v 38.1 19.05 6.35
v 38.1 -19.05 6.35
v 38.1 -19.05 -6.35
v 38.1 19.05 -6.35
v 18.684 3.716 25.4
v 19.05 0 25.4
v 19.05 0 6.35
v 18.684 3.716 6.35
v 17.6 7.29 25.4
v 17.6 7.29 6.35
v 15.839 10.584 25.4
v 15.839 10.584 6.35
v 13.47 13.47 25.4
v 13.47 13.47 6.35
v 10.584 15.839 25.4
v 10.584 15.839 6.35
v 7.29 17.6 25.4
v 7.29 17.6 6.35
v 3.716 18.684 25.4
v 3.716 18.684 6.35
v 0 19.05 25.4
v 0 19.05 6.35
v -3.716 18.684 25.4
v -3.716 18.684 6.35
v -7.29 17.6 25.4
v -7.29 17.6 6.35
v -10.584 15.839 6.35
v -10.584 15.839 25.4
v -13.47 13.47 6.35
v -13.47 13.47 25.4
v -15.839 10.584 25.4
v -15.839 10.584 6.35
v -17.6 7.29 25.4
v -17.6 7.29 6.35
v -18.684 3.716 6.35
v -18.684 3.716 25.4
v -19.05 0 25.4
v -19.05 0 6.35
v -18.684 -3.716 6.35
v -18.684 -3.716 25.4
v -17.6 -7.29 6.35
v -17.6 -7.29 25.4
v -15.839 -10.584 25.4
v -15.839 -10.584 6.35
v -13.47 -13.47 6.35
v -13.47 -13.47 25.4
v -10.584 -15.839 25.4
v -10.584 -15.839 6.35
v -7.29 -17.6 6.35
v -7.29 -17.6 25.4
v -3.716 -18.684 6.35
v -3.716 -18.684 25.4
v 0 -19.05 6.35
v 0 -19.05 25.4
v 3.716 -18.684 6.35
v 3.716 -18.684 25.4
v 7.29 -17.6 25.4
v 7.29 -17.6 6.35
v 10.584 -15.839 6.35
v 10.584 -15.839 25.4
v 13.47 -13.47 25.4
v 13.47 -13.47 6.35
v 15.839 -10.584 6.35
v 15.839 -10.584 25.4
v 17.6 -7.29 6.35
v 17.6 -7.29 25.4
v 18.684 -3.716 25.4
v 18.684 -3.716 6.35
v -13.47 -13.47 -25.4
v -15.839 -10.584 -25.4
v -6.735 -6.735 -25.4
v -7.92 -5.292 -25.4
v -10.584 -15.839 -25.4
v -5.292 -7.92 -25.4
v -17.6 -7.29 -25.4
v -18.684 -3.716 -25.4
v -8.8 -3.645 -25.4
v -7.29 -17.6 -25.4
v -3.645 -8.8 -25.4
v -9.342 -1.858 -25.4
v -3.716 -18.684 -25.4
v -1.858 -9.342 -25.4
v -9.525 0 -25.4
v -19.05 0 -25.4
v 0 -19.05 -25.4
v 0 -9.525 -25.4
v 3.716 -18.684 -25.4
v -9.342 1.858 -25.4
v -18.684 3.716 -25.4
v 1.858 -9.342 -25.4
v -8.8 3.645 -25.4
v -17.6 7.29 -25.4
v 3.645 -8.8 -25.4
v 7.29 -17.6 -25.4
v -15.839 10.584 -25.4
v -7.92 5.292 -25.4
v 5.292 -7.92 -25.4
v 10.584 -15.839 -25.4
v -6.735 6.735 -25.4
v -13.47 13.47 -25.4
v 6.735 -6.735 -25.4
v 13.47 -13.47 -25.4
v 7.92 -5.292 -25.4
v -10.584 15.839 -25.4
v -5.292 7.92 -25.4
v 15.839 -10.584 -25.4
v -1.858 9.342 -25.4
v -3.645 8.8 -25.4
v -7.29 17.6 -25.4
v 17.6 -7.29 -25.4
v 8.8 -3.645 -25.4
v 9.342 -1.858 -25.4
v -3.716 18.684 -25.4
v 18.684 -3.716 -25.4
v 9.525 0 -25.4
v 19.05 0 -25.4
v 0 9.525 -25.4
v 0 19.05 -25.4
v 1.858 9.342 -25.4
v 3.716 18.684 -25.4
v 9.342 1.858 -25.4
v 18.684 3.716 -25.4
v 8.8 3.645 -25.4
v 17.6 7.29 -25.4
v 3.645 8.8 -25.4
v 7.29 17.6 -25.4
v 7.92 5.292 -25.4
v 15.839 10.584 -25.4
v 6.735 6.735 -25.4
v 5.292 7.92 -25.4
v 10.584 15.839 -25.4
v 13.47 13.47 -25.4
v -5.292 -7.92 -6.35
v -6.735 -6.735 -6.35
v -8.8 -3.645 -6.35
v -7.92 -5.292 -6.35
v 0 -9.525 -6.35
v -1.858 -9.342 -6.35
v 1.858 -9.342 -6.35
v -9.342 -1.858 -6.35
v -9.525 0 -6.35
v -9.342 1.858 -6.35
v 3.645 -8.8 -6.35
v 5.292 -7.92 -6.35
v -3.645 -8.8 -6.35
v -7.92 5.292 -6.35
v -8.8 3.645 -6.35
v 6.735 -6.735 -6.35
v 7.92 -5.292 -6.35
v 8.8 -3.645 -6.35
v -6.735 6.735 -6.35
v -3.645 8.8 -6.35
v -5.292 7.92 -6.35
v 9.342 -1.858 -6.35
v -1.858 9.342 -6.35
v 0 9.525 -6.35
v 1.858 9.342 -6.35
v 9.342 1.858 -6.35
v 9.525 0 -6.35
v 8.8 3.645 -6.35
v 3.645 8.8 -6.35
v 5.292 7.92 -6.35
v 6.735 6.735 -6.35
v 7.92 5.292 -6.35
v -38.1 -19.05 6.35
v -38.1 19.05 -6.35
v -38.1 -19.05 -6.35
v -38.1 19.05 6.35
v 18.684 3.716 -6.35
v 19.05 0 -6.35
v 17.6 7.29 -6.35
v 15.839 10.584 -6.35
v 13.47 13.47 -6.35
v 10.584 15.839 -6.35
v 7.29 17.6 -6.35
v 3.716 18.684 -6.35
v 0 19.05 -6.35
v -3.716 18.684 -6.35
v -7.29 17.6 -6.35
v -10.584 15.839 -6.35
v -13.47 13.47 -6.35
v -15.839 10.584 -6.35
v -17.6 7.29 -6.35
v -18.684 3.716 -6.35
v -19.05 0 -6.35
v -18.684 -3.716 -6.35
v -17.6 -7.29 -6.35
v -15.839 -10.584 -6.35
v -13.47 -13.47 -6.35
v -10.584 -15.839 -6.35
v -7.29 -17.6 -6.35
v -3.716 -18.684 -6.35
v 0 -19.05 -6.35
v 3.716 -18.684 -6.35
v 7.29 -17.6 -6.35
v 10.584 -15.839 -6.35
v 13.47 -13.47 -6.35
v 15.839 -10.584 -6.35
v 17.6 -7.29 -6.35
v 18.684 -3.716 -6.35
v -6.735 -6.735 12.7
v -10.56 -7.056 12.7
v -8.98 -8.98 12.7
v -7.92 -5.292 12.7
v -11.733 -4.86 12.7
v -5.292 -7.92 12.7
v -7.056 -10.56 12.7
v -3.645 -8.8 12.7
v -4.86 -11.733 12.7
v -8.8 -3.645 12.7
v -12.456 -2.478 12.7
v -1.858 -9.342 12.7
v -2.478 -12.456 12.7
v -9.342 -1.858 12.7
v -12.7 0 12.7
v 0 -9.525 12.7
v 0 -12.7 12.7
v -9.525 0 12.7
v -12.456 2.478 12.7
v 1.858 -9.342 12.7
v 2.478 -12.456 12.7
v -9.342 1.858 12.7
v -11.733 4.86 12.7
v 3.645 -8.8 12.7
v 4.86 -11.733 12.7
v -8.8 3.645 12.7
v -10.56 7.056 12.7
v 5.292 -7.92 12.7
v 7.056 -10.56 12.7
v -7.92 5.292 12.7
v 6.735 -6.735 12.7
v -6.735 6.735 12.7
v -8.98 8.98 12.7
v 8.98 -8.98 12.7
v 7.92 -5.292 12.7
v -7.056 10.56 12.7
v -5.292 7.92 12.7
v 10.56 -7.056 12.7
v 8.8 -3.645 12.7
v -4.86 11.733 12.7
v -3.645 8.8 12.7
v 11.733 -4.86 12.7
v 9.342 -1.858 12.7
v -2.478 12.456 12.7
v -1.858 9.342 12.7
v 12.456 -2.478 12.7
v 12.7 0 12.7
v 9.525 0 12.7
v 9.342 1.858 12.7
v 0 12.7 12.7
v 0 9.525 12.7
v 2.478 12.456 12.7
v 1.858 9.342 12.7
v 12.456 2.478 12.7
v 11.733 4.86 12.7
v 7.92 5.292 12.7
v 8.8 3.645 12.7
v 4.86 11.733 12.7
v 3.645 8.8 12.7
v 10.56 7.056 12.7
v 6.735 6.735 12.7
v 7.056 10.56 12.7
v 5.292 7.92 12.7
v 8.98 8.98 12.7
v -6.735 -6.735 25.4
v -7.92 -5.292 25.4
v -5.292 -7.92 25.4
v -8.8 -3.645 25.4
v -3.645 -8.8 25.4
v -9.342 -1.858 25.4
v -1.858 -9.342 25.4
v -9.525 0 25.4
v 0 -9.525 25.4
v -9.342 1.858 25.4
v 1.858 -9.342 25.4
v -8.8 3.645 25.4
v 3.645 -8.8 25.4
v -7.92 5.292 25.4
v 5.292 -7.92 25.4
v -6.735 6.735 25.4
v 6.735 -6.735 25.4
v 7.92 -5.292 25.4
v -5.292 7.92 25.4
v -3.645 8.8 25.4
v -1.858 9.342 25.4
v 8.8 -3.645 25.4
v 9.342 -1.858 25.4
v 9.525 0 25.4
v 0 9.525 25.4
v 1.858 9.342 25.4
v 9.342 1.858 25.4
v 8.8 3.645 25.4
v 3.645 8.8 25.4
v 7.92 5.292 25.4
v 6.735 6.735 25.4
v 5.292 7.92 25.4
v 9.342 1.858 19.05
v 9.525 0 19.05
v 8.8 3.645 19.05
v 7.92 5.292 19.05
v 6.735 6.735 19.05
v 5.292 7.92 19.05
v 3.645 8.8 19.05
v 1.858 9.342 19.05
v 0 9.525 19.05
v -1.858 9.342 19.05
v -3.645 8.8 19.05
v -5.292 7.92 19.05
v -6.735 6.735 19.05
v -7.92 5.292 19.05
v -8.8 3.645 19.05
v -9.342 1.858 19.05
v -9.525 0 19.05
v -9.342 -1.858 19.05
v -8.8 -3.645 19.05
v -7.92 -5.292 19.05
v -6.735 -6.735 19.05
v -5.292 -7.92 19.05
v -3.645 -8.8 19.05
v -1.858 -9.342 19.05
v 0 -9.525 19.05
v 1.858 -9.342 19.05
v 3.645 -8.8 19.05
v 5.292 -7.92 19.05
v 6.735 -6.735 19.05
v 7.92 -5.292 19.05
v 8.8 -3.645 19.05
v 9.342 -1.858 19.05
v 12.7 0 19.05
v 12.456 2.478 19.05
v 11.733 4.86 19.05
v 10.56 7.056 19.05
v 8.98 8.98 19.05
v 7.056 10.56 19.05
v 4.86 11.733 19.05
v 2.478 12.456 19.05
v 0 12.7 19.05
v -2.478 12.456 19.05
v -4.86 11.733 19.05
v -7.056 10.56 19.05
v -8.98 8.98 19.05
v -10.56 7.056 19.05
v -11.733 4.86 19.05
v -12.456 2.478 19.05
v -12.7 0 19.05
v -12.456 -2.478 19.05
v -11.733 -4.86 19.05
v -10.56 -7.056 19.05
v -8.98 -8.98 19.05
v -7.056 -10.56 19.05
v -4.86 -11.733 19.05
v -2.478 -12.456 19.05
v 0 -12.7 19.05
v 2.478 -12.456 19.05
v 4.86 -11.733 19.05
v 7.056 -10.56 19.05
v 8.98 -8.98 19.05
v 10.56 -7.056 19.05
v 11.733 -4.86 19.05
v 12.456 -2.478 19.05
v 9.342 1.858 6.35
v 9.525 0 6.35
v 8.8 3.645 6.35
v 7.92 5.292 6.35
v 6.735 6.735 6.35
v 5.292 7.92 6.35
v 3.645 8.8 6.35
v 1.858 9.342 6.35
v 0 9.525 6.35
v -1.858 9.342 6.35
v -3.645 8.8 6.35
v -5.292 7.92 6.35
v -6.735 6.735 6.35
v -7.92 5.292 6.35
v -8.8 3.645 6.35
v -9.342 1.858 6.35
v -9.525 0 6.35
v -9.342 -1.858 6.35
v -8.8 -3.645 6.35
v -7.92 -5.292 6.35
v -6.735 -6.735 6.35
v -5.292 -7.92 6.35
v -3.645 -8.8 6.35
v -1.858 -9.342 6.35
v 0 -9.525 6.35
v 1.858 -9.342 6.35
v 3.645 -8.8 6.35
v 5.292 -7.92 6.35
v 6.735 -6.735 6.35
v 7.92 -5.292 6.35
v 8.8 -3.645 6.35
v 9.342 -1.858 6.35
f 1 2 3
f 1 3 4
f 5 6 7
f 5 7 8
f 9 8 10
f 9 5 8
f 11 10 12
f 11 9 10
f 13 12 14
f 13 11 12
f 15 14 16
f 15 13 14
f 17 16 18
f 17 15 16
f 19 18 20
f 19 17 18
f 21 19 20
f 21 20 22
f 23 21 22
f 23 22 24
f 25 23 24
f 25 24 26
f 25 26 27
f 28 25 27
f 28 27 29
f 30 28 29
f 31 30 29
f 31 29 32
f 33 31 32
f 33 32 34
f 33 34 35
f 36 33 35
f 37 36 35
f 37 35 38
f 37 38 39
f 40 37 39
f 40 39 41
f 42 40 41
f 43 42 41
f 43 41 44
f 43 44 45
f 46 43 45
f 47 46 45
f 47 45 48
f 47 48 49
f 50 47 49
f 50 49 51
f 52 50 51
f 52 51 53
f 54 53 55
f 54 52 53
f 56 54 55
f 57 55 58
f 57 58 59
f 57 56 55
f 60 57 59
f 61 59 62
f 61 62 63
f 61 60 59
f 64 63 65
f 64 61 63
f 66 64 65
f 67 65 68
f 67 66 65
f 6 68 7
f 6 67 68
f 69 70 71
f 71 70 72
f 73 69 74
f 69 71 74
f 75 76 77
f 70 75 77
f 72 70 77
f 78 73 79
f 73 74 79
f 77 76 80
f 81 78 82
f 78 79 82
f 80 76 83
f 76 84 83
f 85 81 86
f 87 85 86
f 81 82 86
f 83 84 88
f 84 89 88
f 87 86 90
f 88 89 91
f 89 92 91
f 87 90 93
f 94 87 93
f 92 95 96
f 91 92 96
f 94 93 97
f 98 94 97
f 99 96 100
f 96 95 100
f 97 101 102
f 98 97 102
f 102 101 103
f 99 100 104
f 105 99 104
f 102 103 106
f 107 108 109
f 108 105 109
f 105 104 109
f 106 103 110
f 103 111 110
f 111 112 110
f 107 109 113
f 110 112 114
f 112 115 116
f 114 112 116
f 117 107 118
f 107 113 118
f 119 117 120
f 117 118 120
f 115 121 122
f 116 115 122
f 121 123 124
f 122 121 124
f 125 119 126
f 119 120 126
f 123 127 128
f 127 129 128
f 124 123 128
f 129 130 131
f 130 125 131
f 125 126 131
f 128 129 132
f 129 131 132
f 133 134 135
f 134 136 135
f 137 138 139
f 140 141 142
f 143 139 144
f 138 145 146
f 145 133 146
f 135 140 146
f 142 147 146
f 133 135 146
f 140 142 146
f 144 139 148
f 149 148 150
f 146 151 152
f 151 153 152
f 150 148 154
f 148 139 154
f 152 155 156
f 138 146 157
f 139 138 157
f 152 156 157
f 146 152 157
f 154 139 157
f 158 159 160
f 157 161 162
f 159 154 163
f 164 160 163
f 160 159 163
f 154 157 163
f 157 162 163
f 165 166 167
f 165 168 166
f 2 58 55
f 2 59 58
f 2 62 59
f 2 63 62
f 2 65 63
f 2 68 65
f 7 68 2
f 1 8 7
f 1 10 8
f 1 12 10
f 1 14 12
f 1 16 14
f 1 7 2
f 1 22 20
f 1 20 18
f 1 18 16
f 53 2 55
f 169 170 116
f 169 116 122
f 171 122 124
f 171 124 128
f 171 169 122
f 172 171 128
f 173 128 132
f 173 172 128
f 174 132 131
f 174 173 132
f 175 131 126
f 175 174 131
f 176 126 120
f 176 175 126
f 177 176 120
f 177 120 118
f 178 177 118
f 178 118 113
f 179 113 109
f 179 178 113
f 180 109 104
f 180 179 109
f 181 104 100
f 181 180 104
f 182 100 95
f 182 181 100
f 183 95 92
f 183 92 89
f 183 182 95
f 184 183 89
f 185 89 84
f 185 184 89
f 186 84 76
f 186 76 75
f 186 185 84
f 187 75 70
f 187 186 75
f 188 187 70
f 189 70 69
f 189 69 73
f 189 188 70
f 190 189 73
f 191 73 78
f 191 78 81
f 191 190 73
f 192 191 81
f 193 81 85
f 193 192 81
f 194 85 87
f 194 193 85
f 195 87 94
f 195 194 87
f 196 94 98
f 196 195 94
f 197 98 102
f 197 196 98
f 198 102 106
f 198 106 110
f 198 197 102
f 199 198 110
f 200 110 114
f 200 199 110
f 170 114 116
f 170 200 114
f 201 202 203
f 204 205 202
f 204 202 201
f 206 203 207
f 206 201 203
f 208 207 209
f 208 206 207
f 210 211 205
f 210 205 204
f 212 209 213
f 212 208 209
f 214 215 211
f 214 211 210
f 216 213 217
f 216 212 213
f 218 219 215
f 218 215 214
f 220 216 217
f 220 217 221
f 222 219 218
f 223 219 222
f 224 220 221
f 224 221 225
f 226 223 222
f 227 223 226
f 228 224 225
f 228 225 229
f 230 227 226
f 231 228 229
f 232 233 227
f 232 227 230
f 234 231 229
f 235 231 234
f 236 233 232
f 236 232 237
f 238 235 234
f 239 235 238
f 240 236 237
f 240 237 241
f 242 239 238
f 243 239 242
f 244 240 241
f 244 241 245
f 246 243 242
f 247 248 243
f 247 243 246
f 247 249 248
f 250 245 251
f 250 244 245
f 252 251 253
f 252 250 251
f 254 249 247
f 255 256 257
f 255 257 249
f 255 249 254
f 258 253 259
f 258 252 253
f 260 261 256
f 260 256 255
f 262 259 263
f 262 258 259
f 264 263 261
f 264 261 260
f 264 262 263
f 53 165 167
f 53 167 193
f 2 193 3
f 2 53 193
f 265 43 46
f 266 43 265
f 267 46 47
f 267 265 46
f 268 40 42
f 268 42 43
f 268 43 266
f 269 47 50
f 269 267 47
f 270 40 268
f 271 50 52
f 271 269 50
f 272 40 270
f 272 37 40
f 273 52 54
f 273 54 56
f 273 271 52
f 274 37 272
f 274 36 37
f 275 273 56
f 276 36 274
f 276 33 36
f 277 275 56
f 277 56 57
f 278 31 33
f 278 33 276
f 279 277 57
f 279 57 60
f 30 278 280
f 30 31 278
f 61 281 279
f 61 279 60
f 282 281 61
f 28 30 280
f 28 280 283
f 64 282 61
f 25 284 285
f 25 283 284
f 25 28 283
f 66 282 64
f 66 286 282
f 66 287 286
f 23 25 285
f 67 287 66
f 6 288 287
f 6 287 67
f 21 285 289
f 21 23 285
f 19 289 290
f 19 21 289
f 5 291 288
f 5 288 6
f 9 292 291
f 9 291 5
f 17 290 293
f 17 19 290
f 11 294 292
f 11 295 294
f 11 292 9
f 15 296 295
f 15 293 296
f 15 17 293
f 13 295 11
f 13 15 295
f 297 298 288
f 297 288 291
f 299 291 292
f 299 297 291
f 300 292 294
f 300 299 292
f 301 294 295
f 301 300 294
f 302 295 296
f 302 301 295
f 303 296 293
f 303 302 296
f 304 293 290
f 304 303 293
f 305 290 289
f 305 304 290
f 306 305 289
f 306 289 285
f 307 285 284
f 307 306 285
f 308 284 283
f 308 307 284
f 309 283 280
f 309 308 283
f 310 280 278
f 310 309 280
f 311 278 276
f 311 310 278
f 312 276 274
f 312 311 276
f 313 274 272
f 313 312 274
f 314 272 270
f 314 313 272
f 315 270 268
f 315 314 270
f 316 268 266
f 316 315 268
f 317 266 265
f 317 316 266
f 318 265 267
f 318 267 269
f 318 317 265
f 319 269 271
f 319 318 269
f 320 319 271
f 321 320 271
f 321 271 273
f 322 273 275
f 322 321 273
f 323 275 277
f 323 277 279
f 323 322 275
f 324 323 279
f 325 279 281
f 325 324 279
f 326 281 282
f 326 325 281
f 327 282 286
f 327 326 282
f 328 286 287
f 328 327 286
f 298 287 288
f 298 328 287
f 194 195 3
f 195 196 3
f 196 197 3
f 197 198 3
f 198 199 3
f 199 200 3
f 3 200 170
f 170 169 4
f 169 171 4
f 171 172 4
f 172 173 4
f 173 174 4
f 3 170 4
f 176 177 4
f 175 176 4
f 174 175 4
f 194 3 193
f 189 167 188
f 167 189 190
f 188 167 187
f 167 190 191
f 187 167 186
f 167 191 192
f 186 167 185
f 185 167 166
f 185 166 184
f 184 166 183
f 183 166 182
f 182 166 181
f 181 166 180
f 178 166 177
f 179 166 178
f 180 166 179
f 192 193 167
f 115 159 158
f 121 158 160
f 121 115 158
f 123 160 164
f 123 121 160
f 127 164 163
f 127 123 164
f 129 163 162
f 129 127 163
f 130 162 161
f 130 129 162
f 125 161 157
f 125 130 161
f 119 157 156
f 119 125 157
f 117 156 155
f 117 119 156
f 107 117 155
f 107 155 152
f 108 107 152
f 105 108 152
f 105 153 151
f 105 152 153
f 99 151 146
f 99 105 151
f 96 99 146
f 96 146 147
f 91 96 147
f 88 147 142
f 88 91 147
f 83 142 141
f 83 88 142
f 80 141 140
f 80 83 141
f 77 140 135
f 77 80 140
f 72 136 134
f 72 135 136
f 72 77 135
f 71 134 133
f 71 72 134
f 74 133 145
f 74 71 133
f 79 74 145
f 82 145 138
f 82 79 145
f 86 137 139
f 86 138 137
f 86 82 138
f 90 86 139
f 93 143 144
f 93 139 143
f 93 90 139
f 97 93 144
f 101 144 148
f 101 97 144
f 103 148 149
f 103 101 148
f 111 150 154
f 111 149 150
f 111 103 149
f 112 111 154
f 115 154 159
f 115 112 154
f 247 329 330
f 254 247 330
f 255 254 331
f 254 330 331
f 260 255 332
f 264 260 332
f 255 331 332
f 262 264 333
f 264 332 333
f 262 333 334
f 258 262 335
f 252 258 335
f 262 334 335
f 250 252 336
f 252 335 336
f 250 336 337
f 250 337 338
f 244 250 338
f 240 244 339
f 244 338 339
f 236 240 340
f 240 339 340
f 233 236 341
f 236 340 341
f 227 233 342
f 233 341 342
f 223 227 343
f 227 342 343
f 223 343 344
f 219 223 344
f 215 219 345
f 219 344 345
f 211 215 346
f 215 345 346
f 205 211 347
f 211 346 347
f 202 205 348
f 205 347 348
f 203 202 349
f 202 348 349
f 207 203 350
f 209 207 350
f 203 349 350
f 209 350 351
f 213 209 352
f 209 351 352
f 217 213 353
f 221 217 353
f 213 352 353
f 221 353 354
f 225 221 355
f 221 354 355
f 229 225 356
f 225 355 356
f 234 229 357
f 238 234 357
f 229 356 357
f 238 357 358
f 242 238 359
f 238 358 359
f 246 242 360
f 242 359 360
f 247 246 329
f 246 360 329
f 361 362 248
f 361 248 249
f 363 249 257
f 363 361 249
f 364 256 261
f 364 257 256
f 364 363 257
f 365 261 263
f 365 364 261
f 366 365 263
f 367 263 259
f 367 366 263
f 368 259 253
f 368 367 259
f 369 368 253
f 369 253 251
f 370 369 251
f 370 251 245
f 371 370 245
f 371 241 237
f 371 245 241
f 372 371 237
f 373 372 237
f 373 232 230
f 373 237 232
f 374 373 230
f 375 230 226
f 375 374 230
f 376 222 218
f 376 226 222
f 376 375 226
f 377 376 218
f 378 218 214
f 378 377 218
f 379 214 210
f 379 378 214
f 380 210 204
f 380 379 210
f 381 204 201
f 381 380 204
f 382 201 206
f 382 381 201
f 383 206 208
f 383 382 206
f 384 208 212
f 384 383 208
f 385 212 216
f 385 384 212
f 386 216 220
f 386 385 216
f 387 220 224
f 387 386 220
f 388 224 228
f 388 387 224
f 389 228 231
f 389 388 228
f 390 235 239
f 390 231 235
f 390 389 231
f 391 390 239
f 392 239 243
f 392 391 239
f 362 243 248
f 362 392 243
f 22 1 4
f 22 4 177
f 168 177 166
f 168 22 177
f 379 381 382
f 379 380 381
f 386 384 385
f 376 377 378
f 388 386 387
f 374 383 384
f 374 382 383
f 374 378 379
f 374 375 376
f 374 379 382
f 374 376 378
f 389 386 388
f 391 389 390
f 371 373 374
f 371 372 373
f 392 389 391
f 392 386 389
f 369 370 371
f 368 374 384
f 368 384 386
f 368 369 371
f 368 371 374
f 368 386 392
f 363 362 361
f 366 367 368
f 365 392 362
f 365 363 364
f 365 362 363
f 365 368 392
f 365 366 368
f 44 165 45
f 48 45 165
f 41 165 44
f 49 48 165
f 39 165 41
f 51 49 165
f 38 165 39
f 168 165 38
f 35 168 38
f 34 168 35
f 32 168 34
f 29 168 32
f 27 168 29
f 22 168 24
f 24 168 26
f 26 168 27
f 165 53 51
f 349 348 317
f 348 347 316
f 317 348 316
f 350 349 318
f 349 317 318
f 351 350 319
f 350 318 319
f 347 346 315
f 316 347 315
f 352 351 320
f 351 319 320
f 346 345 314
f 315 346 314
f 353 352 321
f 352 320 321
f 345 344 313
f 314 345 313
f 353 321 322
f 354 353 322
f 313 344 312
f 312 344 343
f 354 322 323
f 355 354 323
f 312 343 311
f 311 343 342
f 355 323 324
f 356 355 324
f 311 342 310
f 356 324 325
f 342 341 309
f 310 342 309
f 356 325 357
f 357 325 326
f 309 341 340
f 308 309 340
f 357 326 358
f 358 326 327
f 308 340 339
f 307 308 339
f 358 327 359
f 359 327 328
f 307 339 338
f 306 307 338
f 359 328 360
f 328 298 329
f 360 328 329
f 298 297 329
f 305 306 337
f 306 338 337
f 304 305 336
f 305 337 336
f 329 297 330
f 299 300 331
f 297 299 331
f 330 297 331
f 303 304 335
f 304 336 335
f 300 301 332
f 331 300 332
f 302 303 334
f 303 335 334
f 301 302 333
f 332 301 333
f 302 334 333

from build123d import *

# Parameters (mm, degrees)
F0_R     = 19.05
F0_R_2   = 9.525
F1_DEPTH = 25.4
F3_START = -6.35
F2_R     = 12.7
F3_DEPTH = 6.35
F5_DEPTH = 6.35


with BuildPart() as f1:
    # F0 (on Top) → F1 (new body, symmetric)
    with BuildSketch(Plane.XY):
        Circle(F0_R)
        Circle(F0_R_2, mode=Mode.SUBTRACT)
    extrude(amount=F1_DEPTH, both=True)

    # F2 (on face) → F3 (cut)
    with BuildSketch(Plane.XY.offset(25.4).offset(F3_START)):
        Circle(F2_R)
    extrude(amount=-F3_DEPTH, mode=Mode.SUBTRACT)

    # F4 (on Top) → F5 (join, symmetric)
    with BuildSketch(Plane.XY):
        Polygon((-38.1, 19.05), (-38.1, 0), (-38.1, -19.05), (38.1, -19.05), (38.1, 0), (38.1, 19.05), align=None)
    extrude(amount=F5_DEPTH, both=True)


solid = f1.part
